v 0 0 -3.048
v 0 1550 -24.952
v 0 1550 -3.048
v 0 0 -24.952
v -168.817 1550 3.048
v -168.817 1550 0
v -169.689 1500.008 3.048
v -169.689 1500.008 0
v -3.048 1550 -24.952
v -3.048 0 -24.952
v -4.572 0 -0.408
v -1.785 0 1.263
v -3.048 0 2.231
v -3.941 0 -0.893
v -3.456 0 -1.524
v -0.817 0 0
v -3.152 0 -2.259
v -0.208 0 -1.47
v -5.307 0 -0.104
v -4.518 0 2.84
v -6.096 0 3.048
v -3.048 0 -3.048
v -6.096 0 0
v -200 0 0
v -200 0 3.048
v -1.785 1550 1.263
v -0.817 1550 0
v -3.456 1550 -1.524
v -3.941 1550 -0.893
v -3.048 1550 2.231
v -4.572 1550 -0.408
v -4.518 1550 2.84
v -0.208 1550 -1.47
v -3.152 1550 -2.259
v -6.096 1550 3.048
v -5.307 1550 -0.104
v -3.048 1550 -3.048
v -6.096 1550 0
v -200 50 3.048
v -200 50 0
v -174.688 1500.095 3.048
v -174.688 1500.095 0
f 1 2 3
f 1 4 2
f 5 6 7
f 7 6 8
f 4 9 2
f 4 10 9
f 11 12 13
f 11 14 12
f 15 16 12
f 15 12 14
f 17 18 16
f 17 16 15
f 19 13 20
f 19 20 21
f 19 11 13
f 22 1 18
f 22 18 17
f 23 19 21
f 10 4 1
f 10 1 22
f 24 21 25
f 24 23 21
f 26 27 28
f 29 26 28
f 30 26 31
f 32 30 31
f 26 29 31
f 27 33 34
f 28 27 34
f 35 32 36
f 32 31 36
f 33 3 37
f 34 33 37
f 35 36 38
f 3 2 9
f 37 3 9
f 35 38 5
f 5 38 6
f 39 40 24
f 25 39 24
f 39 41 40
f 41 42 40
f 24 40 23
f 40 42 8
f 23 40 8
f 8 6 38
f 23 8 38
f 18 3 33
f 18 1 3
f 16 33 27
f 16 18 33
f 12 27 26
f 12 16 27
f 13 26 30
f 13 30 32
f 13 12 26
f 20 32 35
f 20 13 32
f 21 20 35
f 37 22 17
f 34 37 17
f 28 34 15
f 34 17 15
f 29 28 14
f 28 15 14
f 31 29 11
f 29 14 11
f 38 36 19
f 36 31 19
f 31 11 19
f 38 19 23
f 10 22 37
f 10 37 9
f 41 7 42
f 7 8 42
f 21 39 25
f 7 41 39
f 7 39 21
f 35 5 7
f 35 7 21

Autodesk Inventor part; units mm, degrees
ref_plane "YZ Plane" through (0, 0, 0) normal (1, 0, 0) x (0, 1, 0)
ref_plane "XZ Plane" through (0, 0, 0) normal (0, 1, 0) x (-1, 0, 0)
ref_plane "XY Plane" through (0, 0, 0) normal (0, 0, 1) x (1, 0, 0)
sketch "Sketch1" plane through (0, 0, 0) normal (0, 0, 1) x (1, 0, 0)
  line L0 (0, 0) -> (0, 1550)
  line L1 (0, 1550) -> (-168.8166, 1550)
  line L2 (-168.8166, 1550) -> (-194.9992, 50)
  line L3 (-194.9992, 50) -> (-194.9992, 0) construction
  line L4 (-194.9992, 0) -> (0, 0)
  line L5 (-169.6893, 1500.0076) -> (-174.6885, 1500.0949)
  line L6 (-174.6885, 1500.0949) -> (-200, 50)
  line L7 (-200, 50) -> (-200, 0)
  line L8 (-200, 0) -> (-194.9992, 0)
  line L9 (-200, 50) -> (-194.9992, 50) construction
  dimension "d0" = 1550
  dimension "d1" = 168.8166
  dimension "d2" = 5
  dimension "d3" = 200
  dimension "d4" = 50
  dimension "d6" = 50
  dimension "d17" = 89
extrude "Plate1" add sketch "Sketch1" along normal blind 3.048
sketch "Sketch2" plane through (-3.048, 0, 3.048) normal (1, 0, 0) x (0, 1, 0)
  line L0 (1550, 0) -> (0, 0)
  line L1 (0, 0) -> (0, -28)
  line L2 (0, -28) -> (1550, -28)
  line L3 (1550, -28) -> (1550, 0)
edge flange "Flange1" height 28 angle 90 thickness 3.048 bend radius 3.048 thickness toward (1, 0, 0) relief tear relief width 3.048 relief depth 1.524 edges at (0, 775, 0) wall of the first edge with corners at (-3.048, 1550, 3.048) (-3.048, 0, 3.048) (-3.048, 0, -24.952) (-3.048, 1550, -24.952)
bend "Bend1"
corner "Corner1"
equation "\"d5\" = Thickness"
equation "\"d7\" = BendReliefWidth"
equation "\"d8\" = BendReliefDepth"
equation "\"d9\" = MinimumRemnant"
equation "\"d10\" = TransitionRadius"
equation "\"d13\" = BendRadius"
equation "\"d14\" = CornerReliefSize"
equation "\"d15\" = GapSize"
equation "\"d16\" = JacobiRadiusSize"
equation "\"BendRadius\" = Thickness"
equation "\"BendReliefWidth\" = Thickness"
equation "\"BendReliefDepth\" = 0.5 * Thickness"
equation "\"CornerReliefSize\" = 4 * Thickness"
equation "\"MinimumRemnant\" = 2 * Thickness"
equation "\"TransitionRadius\" = BendRadius"
equation "\"JacobiRadiusSize\" = BendRadius"
equation "\"GapSize\" = Thickness"
equation "\"Thickness\" = 3.048"
